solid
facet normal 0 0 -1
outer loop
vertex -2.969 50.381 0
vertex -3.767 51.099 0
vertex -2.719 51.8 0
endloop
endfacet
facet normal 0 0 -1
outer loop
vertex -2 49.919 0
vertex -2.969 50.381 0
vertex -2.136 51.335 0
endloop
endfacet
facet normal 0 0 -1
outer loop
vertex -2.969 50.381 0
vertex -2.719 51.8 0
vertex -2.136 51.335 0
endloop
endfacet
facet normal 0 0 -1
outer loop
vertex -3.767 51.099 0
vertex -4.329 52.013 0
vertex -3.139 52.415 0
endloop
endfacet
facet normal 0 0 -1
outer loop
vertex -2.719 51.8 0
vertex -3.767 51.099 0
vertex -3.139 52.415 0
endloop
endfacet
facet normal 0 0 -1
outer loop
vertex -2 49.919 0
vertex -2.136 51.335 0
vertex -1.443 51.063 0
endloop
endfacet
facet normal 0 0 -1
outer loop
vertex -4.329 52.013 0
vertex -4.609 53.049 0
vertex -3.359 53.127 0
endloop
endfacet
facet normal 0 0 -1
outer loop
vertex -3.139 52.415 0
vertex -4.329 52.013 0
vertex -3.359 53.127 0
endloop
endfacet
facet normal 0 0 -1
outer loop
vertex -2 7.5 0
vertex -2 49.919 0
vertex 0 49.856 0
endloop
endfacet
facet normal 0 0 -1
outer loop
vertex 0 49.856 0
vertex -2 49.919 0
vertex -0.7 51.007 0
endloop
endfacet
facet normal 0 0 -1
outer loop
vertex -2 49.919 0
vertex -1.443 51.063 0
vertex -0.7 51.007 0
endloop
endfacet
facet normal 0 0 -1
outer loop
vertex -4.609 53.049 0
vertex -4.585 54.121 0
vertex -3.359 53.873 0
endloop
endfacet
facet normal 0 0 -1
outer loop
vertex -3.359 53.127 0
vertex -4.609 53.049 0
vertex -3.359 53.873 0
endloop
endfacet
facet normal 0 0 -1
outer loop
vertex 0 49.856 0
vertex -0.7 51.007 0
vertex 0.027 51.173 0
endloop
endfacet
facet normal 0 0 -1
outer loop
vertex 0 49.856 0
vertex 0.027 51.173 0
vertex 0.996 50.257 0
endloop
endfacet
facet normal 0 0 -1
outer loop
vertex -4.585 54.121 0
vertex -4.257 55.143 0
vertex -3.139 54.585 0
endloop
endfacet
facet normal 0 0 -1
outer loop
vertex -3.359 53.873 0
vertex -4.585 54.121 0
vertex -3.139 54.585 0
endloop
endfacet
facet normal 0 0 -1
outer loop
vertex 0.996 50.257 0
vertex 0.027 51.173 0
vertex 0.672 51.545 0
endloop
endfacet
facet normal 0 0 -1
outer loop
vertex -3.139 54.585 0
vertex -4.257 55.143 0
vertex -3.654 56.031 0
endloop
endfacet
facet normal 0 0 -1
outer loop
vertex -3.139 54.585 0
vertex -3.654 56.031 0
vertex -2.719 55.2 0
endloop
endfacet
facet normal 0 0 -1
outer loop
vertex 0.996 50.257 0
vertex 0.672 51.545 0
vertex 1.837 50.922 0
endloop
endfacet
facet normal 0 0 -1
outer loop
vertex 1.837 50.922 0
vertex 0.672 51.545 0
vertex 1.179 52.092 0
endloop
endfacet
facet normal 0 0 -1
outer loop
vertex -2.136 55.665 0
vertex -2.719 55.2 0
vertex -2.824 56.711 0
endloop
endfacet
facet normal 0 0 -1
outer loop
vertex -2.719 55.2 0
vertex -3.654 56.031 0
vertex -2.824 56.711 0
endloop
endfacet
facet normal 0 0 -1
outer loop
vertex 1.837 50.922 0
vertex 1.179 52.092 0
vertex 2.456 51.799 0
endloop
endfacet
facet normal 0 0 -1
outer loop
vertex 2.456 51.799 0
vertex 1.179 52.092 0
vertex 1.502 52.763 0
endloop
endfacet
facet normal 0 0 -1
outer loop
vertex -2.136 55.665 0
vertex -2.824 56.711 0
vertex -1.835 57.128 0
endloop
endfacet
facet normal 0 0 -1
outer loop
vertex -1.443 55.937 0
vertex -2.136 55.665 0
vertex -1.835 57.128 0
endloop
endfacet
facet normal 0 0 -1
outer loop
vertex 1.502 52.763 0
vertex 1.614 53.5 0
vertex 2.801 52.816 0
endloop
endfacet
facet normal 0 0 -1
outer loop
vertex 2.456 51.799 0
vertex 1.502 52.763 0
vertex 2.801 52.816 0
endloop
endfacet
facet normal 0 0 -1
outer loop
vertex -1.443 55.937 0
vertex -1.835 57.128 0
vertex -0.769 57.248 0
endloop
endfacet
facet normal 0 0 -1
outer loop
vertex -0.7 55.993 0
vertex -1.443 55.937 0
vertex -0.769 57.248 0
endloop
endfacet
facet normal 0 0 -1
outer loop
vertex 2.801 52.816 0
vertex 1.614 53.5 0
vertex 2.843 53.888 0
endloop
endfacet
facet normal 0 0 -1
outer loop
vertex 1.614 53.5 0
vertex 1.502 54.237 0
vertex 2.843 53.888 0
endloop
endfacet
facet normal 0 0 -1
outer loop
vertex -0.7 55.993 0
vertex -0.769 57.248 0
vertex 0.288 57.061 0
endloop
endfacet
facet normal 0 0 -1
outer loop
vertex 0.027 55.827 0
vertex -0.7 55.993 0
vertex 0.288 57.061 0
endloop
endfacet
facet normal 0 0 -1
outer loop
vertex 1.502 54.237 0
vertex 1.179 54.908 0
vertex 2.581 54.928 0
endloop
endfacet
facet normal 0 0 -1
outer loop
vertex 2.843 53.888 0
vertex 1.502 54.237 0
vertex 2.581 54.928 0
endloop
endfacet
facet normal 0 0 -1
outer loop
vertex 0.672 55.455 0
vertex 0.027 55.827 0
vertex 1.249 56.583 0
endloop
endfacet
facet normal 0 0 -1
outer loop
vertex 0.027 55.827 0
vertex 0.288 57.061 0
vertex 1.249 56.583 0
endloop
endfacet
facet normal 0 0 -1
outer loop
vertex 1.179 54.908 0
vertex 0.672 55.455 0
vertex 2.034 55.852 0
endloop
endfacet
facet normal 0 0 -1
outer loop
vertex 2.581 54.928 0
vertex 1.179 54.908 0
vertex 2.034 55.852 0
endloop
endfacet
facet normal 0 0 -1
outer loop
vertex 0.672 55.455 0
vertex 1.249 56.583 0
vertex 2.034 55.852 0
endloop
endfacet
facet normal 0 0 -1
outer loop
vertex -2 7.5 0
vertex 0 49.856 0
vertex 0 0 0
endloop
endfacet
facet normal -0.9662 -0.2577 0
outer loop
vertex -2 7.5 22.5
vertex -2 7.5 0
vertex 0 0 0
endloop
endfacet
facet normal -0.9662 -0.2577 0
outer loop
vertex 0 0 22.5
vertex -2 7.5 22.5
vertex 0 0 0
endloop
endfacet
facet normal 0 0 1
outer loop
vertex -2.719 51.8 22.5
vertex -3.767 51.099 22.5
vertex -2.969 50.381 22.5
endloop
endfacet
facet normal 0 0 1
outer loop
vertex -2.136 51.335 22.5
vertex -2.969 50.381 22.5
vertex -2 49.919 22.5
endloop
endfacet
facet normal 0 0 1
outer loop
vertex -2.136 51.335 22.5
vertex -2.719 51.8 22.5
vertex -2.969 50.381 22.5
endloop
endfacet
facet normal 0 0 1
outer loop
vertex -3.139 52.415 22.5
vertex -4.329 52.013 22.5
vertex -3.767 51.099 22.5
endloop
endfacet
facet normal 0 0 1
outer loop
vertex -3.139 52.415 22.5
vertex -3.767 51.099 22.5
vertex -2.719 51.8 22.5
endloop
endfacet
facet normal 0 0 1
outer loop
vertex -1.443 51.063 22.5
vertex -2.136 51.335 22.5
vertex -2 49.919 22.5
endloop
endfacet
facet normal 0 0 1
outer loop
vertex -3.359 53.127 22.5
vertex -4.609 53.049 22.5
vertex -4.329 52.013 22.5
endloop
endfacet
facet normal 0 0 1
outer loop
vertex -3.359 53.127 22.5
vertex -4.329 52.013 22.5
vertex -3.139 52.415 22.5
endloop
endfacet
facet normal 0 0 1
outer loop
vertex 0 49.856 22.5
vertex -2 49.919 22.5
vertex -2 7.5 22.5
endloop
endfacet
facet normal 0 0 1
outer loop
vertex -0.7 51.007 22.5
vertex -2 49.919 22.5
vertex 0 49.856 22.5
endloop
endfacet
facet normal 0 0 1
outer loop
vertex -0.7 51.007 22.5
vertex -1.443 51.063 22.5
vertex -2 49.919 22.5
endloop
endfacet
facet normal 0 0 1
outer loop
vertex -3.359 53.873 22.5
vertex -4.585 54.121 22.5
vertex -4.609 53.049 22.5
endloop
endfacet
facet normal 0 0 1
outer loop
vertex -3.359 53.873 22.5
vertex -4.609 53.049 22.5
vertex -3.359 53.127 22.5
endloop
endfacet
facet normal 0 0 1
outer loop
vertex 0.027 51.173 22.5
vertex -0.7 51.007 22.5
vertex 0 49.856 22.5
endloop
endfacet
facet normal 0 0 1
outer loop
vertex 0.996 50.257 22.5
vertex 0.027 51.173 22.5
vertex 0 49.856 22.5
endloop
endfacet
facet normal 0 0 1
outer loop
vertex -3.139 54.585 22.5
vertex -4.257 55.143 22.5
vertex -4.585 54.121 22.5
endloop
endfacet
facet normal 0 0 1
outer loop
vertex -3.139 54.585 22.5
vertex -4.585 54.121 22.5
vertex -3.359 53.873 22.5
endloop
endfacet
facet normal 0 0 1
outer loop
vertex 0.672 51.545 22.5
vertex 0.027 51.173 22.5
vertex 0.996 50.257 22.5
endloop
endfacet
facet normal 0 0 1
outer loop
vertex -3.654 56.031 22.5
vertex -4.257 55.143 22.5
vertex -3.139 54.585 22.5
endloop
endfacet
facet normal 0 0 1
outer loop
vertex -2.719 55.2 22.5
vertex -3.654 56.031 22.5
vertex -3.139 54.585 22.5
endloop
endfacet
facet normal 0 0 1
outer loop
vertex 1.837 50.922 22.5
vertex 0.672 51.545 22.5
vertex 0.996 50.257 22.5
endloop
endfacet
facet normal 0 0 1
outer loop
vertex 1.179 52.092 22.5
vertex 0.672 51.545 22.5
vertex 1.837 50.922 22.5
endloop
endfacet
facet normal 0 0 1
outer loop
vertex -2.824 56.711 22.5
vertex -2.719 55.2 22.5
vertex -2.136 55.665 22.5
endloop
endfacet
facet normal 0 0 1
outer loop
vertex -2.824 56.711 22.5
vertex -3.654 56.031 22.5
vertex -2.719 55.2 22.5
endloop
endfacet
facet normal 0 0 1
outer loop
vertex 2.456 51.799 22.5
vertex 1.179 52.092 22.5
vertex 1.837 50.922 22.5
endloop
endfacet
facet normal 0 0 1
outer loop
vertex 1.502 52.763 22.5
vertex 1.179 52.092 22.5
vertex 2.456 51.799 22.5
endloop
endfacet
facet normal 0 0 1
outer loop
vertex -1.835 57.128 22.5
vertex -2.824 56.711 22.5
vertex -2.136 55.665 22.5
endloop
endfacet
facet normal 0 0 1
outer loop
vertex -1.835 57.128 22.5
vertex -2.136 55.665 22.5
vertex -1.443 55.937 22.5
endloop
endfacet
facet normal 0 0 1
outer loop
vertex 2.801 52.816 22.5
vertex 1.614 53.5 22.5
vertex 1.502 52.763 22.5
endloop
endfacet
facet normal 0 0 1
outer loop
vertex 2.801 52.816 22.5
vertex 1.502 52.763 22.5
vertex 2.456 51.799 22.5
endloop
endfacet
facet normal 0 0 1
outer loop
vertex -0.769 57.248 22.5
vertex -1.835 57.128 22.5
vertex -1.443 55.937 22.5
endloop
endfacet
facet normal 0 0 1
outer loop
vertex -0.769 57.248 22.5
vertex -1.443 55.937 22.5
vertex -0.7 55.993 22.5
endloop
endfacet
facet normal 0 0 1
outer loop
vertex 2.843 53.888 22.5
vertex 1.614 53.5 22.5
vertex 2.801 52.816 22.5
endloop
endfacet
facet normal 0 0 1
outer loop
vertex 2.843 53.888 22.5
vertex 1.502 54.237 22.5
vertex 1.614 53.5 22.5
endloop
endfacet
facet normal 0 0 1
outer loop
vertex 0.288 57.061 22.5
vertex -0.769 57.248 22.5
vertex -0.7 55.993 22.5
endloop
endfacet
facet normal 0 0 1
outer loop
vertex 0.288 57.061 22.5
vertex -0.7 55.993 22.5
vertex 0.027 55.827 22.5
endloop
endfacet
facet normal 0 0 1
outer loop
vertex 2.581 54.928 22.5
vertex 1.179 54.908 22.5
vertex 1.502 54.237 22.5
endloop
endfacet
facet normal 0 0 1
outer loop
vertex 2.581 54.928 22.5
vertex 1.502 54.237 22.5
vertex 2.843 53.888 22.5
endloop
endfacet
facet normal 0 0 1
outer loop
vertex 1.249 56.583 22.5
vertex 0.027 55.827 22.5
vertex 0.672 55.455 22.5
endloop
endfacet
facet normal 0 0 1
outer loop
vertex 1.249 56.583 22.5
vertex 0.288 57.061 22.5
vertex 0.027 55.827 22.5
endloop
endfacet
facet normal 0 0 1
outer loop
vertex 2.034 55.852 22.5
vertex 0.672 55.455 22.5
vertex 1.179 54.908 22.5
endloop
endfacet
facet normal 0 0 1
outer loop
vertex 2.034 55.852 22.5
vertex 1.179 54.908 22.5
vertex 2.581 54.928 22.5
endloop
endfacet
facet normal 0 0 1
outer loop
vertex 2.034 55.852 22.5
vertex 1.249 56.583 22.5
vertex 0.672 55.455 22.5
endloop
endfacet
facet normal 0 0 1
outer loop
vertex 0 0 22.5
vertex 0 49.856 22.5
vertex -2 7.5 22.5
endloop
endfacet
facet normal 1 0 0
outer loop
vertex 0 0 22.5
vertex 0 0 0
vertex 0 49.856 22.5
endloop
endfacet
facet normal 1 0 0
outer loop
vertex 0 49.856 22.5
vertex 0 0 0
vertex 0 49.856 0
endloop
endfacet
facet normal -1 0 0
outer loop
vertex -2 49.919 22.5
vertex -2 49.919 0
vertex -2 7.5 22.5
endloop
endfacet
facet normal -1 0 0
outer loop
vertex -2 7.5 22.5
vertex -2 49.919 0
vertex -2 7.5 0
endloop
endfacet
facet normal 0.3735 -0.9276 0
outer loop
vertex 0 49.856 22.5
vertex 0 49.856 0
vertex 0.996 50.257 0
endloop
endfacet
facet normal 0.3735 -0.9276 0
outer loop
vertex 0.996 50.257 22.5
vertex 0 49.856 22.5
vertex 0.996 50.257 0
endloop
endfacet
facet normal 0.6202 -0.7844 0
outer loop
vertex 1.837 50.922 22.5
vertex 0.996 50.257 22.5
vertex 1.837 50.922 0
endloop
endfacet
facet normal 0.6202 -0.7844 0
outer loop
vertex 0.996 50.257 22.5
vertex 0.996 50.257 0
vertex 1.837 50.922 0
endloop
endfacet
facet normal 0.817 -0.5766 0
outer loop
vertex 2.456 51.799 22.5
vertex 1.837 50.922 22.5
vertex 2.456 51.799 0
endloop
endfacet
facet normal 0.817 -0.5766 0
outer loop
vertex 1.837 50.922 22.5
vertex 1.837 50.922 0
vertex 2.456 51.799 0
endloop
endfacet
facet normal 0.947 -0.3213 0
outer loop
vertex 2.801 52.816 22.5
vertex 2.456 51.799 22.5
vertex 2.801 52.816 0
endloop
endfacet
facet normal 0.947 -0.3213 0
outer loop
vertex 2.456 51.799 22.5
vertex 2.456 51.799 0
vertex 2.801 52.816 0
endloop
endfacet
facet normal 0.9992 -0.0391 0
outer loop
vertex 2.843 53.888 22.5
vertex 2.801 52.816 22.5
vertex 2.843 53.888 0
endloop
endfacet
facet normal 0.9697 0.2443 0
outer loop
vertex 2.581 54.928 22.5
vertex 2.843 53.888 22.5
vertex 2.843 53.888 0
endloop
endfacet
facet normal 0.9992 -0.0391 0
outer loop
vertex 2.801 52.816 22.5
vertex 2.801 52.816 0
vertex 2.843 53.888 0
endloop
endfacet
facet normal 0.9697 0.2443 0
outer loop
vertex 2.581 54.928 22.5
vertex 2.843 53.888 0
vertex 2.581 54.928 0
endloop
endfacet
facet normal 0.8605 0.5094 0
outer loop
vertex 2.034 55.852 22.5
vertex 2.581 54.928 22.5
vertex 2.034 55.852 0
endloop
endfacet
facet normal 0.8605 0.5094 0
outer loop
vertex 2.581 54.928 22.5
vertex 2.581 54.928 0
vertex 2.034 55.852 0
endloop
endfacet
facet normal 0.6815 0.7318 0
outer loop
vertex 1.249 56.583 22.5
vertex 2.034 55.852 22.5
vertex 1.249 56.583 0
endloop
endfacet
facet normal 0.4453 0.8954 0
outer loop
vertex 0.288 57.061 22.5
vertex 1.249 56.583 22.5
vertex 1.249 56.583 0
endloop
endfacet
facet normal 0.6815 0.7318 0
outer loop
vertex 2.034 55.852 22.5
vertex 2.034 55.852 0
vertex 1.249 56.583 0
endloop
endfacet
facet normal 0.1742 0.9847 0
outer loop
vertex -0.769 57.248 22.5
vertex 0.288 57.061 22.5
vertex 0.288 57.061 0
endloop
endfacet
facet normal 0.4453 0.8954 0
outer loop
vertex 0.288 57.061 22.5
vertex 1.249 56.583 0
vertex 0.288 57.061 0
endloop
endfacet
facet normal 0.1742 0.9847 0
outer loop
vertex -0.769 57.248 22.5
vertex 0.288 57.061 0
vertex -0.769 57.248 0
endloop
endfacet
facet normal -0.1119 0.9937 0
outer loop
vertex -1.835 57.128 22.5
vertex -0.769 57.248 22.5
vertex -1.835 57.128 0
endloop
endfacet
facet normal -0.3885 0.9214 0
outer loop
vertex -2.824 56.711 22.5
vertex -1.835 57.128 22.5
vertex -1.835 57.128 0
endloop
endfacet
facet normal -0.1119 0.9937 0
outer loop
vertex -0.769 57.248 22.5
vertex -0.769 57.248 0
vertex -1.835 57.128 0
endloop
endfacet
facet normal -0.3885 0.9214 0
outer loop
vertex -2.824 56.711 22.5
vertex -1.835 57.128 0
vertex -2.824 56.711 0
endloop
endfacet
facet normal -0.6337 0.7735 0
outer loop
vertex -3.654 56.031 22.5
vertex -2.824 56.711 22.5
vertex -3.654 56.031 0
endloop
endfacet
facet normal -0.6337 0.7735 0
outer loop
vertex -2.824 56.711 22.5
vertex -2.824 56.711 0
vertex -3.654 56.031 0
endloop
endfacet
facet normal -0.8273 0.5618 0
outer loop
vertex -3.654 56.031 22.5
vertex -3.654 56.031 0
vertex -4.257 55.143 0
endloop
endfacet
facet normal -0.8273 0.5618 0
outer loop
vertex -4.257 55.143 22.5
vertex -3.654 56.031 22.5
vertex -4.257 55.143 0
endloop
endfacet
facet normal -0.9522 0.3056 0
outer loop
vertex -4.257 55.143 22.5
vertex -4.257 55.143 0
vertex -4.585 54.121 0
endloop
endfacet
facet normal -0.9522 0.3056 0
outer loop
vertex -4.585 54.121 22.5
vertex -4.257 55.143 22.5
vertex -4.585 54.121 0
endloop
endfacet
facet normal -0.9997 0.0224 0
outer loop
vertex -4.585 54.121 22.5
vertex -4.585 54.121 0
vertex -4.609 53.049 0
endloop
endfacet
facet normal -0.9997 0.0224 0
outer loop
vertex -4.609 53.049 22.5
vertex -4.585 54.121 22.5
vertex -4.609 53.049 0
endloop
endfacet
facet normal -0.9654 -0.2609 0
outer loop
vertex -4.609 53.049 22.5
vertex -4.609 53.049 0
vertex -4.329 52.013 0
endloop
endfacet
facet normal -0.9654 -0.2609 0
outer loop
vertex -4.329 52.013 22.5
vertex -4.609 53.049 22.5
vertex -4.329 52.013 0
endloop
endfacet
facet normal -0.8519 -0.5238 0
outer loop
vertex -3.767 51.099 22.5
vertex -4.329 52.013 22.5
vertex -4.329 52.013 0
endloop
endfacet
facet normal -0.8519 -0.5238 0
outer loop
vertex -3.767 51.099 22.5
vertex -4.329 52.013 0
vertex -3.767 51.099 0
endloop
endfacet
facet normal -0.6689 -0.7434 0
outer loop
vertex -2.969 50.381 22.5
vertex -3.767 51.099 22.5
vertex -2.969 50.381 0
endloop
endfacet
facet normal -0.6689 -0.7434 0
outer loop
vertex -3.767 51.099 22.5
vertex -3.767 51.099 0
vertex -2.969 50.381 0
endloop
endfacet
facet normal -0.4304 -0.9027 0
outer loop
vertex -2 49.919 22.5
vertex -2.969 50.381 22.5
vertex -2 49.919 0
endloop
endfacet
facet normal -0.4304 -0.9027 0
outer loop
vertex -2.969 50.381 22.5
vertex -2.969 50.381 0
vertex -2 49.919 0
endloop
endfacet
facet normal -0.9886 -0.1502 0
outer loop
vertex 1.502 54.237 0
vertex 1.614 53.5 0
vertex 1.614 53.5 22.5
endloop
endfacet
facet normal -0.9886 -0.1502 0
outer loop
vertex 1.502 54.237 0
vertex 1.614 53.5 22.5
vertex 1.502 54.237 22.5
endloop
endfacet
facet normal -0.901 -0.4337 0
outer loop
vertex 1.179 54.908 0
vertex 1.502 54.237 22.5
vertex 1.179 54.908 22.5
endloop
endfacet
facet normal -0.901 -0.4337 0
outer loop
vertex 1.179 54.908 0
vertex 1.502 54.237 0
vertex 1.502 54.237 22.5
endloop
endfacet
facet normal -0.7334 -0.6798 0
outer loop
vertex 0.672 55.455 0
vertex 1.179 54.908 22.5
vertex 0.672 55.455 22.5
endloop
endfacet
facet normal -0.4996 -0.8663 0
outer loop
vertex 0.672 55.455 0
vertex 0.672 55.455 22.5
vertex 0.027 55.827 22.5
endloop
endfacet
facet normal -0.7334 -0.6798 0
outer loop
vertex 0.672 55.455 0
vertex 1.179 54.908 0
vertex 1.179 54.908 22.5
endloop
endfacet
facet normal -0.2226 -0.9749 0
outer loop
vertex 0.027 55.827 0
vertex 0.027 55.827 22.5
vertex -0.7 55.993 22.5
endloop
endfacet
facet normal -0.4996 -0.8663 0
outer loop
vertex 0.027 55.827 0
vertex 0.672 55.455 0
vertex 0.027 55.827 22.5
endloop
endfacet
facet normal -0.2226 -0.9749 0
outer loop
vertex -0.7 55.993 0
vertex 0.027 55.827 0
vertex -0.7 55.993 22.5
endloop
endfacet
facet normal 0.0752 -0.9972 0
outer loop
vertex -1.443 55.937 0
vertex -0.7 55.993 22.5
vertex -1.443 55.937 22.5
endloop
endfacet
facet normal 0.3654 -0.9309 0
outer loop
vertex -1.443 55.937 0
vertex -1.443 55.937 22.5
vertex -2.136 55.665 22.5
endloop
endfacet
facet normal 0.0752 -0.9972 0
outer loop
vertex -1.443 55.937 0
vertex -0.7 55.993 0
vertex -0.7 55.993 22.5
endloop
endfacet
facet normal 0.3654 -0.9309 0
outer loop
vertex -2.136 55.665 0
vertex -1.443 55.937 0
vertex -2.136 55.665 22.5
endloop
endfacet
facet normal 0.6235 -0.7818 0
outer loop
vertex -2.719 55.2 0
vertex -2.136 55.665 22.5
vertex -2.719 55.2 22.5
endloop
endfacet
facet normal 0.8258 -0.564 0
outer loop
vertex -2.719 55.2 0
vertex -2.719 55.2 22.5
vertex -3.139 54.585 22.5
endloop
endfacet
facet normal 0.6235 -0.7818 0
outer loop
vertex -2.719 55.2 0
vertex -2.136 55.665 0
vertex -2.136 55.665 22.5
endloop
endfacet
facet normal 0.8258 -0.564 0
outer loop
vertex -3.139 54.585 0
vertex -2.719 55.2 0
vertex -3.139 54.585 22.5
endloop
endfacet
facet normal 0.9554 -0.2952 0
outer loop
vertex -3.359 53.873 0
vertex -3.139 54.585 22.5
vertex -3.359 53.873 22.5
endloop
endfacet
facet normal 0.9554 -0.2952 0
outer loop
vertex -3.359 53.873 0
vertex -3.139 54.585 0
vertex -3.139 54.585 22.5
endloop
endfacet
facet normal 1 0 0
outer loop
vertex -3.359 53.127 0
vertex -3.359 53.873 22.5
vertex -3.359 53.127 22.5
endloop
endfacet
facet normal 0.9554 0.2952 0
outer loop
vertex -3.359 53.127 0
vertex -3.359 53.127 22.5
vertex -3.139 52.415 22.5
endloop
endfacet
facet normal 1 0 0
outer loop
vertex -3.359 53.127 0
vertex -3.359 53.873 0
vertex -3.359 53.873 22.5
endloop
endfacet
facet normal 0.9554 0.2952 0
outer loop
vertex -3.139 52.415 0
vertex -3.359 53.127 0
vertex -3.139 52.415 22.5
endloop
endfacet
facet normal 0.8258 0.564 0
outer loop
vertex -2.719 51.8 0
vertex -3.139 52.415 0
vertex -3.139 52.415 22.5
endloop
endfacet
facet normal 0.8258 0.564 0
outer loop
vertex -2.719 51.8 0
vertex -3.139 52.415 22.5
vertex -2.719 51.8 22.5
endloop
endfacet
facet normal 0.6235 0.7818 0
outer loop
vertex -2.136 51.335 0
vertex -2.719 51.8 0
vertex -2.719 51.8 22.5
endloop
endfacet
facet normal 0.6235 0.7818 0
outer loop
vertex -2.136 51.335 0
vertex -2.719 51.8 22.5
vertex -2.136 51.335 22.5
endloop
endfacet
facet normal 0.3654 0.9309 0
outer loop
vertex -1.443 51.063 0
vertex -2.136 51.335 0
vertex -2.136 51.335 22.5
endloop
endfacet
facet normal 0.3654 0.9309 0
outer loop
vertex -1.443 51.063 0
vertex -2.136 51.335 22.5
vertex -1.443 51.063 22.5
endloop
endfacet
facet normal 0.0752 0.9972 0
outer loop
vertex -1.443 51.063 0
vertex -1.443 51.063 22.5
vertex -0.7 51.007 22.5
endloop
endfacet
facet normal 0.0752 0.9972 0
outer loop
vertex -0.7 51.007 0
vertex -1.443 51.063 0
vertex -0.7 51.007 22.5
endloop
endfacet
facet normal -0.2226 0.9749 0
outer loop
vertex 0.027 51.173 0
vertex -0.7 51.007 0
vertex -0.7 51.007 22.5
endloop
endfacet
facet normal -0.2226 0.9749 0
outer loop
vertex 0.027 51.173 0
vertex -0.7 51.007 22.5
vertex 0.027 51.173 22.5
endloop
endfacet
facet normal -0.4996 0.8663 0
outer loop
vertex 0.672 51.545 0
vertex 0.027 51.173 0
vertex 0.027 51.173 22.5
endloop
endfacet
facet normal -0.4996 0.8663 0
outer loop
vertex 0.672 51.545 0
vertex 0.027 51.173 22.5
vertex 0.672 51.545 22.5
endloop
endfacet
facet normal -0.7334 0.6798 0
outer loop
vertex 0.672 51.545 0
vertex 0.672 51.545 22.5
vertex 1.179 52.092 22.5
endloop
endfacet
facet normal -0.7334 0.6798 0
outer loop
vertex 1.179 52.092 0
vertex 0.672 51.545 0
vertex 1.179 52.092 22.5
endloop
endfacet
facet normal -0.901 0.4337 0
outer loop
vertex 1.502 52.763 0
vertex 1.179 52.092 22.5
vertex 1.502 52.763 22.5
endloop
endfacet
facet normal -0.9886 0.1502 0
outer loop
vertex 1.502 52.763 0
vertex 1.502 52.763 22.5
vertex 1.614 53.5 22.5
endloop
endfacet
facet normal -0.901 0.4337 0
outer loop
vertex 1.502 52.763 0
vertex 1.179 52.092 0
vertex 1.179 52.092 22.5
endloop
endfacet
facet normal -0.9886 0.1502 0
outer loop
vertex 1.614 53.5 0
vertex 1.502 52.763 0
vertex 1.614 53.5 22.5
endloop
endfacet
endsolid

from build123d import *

# Parameters (mm, degrees)
CROQUIS1_R              = 2.5
SALIENTE_EXTRUIR2_DEPTH = 22.5


with BuildPart() as part:
    # Croquis1 → Saliente-Extruir2 (new body)
    with BuildSketch(Plane.XY):
        with BuildLine():
            Line((0, 0), (0, 49.8562756))
            ThreePointArc((0, 49.8562756), (-0.768605016, 57.248148258), (-2, 49.919150955))
            Line((-2, 49.919150955), (-2, 7.5))
            Line((-2, 7.5), (0, 0))
        make_face()
        with Locations((-0.886438093, 53.5)):
            Circle(CROQUIS1_R, mode=Mode.SUBTRACT)
    extrude(amount=SALIENTE_EXTRUIR2_DEPTH)


solid = part.part
